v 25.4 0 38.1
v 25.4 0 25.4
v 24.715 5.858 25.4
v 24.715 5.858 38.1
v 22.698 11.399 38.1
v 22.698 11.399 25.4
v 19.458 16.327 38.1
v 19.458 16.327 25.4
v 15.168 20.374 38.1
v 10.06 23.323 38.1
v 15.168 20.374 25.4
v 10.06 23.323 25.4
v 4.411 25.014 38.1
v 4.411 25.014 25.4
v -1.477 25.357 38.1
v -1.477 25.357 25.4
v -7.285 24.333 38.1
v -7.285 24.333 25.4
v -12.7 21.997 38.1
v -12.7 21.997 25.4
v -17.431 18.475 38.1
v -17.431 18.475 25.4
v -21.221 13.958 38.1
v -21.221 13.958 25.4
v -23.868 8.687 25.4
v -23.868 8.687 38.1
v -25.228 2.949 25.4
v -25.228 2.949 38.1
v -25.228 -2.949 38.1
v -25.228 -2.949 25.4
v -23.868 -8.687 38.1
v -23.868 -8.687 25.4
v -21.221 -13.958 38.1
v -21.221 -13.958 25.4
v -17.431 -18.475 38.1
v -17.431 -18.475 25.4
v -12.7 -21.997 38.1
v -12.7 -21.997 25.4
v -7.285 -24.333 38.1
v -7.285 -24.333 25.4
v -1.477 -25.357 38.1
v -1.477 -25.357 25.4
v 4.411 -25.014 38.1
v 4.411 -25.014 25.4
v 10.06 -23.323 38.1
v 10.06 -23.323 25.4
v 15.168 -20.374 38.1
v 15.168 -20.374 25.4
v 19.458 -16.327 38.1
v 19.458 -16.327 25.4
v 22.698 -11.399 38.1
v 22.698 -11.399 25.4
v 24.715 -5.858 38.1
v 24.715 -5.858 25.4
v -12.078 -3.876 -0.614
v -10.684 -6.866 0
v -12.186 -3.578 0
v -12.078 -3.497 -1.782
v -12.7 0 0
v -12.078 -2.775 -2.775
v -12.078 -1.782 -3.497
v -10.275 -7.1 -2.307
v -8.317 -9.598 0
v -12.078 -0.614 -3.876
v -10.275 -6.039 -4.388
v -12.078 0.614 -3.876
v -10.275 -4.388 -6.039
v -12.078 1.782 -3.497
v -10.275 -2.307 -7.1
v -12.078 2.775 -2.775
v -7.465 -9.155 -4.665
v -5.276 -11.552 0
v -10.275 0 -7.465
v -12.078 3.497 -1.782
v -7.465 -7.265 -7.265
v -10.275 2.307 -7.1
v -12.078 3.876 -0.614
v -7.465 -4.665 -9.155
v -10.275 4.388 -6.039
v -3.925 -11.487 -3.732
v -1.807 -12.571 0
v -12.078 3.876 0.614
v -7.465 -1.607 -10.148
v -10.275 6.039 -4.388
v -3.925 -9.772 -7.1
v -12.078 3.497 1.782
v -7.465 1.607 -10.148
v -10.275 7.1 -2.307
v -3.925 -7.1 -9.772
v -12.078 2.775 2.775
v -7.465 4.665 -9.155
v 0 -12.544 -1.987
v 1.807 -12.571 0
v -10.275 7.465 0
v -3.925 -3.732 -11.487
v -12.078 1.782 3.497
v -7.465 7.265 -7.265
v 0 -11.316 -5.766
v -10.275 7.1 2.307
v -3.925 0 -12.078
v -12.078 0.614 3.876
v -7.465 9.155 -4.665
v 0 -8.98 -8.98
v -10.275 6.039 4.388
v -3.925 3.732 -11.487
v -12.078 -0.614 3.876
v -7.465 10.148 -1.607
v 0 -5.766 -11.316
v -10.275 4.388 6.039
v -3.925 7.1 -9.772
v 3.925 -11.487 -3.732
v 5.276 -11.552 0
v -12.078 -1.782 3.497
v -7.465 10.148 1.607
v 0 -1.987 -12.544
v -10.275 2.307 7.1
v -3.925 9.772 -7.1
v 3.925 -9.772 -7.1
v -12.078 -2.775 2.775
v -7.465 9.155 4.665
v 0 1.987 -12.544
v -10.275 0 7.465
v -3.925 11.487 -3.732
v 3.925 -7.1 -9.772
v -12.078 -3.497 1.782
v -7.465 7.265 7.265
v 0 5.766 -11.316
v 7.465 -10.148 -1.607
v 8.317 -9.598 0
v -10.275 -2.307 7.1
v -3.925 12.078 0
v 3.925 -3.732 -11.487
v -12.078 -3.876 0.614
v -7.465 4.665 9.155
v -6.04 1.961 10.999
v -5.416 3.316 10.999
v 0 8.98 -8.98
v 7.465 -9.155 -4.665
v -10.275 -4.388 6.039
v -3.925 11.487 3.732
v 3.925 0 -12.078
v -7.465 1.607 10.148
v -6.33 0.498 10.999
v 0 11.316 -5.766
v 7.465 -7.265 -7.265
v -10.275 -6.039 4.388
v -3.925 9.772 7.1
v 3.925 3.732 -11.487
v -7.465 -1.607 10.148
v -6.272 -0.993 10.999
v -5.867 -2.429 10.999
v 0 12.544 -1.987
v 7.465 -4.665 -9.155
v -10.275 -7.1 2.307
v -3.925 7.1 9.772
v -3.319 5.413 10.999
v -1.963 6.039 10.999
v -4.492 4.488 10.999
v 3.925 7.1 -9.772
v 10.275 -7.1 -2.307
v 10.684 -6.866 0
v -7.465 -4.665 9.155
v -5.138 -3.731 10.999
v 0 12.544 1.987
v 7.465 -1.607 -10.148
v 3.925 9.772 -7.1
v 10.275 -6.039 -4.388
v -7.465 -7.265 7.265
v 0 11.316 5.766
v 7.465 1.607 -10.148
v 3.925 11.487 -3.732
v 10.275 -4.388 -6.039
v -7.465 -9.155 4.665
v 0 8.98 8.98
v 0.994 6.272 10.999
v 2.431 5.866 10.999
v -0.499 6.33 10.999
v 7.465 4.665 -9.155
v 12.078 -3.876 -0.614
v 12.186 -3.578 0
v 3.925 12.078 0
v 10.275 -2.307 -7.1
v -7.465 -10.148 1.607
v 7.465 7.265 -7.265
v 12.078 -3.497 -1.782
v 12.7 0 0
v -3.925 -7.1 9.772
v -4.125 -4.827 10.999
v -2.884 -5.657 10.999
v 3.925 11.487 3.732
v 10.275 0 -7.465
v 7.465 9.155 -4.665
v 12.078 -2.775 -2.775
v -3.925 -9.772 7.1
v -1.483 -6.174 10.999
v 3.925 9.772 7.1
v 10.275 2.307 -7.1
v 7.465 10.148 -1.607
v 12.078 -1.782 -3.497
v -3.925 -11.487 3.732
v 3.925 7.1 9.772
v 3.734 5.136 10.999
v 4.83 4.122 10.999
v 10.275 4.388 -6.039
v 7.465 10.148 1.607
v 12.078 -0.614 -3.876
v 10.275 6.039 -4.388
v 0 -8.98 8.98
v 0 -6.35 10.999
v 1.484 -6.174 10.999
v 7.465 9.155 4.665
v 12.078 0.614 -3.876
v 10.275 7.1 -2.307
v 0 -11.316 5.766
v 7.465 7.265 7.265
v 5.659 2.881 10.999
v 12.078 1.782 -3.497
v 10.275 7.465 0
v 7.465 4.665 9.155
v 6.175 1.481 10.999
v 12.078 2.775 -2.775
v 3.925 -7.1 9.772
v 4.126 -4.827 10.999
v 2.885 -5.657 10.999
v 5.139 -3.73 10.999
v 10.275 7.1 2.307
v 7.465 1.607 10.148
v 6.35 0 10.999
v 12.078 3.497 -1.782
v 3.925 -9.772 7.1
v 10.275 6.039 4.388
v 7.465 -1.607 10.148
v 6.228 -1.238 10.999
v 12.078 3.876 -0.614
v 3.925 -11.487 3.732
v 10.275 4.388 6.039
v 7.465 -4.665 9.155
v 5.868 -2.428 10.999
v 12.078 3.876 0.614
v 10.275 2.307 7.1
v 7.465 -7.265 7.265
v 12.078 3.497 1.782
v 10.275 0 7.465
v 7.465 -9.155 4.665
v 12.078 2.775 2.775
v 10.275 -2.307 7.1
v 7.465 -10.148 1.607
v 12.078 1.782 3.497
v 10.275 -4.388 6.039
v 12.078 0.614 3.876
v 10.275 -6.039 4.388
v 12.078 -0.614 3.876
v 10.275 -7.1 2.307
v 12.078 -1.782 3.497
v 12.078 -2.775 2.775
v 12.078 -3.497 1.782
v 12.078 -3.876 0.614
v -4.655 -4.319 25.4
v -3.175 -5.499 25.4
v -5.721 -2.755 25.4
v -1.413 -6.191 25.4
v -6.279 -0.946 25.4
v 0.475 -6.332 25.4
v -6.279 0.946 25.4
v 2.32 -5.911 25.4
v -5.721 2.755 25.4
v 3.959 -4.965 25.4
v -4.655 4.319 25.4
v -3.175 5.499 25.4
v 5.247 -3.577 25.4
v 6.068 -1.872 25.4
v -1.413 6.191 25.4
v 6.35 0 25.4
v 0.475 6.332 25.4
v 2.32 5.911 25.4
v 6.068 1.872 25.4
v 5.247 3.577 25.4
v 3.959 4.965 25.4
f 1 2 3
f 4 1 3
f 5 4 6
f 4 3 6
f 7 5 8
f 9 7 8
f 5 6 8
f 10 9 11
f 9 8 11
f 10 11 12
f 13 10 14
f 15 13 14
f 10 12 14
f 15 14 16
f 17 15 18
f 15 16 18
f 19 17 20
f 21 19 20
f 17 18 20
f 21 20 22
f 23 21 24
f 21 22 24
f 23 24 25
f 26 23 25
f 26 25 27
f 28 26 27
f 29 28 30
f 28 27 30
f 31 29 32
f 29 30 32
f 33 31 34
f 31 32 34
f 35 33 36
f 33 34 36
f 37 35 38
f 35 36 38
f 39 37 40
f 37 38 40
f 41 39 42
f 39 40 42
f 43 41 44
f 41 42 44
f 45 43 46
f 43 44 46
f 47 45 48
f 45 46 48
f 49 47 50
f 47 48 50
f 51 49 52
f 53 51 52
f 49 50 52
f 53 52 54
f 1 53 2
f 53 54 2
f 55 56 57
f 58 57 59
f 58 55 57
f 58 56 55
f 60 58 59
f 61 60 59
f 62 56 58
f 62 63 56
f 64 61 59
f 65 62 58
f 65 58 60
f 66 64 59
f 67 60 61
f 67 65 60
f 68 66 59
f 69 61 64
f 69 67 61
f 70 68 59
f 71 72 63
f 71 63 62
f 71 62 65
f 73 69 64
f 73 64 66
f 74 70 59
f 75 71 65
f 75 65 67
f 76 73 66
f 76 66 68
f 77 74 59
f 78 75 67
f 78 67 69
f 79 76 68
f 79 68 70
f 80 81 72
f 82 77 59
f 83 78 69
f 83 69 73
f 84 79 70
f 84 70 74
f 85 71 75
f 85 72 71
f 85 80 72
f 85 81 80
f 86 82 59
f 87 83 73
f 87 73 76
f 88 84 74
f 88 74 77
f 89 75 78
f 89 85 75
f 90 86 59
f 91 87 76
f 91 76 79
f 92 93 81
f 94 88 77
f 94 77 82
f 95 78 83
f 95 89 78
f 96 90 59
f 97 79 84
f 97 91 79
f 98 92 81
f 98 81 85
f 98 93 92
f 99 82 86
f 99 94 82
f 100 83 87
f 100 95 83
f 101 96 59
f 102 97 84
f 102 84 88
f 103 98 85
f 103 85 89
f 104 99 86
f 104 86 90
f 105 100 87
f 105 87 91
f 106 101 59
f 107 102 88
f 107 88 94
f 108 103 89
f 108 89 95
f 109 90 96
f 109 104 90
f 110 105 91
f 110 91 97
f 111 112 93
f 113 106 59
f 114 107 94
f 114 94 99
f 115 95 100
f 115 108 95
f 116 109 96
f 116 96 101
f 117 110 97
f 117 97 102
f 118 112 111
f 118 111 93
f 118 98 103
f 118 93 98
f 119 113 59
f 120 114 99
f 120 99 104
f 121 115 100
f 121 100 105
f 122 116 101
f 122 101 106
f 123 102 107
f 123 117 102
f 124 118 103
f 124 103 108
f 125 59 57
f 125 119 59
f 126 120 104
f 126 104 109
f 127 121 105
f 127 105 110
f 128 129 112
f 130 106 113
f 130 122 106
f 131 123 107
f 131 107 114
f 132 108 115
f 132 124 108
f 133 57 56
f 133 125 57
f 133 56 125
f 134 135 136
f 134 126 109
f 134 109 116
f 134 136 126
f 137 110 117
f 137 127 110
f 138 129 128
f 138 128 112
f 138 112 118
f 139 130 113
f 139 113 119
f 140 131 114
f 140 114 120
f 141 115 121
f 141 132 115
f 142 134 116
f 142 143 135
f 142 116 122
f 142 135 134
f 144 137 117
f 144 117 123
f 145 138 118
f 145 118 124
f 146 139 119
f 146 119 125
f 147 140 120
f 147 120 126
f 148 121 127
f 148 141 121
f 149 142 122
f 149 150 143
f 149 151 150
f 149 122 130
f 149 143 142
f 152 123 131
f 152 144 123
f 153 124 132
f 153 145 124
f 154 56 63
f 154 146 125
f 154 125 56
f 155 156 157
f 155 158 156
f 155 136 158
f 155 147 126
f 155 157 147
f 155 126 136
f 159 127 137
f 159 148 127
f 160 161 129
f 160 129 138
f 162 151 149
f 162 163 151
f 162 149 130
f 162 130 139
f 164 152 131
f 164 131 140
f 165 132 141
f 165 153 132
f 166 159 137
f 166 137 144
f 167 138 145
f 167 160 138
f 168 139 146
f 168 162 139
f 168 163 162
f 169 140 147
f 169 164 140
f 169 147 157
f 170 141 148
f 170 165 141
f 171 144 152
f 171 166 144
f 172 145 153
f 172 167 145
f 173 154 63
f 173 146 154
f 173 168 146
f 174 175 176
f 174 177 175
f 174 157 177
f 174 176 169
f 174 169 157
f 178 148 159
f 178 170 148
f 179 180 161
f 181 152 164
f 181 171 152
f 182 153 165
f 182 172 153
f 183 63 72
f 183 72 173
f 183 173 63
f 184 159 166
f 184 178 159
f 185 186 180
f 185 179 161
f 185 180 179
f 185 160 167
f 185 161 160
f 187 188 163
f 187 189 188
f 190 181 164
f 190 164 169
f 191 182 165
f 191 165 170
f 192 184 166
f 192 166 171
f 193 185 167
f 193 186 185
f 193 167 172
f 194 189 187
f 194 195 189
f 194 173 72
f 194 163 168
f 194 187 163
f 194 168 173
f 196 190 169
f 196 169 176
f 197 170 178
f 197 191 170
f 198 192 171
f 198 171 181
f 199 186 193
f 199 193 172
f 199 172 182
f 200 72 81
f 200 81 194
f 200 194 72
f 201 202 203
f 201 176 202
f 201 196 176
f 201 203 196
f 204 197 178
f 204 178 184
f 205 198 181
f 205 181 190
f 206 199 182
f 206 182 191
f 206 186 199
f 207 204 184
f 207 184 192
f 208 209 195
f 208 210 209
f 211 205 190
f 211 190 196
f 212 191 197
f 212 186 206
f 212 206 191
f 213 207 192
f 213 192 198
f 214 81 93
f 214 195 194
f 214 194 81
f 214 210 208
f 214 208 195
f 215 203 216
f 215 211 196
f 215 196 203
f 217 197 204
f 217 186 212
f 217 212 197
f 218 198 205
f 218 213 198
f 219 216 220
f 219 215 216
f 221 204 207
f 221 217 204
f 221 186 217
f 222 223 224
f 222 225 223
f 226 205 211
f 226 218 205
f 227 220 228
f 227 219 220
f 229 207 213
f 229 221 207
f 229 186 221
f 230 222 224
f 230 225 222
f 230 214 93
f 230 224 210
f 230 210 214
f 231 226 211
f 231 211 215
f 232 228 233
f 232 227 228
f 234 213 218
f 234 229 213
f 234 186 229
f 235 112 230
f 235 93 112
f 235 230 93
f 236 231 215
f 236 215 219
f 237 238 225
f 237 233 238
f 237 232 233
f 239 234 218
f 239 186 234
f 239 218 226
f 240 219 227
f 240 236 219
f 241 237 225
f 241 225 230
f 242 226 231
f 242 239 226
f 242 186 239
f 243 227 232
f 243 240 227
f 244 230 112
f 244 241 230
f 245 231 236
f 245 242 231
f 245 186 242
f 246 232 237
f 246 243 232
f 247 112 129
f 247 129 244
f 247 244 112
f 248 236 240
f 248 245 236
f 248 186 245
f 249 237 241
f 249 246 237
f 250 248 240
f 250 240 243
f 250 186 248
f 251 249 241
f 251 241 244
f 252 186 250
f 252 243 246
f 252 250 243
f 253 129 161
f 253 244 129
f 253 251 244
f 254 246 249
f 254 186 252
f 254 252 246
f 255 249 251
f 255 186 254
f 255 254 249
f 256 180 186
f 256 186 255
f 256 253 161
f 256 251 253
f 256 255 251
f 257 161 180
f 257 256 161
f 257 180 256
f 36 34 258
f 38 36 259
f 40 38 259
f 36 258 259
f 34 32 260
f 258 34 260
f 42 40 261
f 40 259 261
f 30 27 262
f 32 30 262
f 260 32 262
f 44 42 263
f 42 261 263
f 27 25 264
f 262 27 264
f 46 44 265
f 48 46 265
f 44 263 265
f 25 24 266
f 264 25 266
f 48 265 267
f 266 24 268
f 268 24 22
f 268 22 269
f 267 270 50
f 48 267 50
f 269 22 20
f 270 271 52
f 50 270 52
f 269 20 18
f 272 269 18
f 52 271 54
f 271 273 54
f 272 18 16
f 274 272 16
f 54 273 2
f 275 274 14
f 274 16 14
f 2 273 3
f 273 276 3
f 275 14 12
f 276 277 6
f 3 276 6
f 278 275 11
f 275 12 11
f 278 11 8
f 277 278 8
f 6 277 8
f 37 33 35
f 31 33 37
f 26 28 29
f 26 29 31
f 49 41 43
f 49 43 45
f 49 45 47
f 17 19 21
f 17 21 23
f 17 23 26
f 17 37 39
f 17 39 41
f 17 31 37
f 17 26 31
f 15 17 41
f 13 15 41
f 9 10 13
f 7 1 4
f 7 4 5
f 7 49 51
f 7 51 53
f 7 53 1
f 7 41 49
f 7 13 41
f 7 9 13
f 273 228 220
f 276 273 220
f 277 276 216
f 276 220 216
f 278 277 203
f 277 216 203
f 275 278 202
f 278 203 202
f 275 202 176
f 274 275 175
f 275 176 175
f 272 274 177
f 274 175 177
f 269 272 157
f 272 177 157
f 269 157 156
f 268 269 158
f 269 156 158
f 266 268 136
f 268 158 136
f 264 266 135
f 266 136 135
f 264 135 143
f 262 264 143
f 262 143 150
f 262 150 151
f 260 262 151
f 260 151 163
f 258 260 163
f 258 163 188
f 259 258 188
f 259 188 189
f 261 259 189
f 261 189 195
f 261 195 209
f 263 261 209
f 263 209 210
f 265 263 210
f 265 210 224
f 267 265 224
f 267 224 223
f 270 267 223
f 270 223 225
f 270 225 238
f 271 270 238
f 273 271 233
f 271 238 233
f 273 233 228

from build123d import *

# Parameters (mm, degrees)
F2_R     = 6.35
F3_DEPTH = 25.4
F4_R     = 25.4
F5_DEPTH = 12.7


with BuildPart() as f1:
    # F0 (on Top) → F1 (revolve)
    with BuildSketch(Plane.XY):
        with BuildLine():
            ThreePointArc((-12.7, 0), (0, -12.7), (12.7, 0))
            Line((12.7, 0), (-12.7, 0))
        make_face()
    revolve(axis=Axis((0, 0, 0), (1, 0, 0)))

    # F2 (on Top) → F3 (join)
    with BuildSketch(Plane.XY):
        Circle(F2_R)
    extrude(amount=F3_DEPTH)

    # F4 (on face) → F5 (join)
    with BuildSketch(Plane.XY.offset(25.4)):
        Circle(F4_R)
    extrude(amount=F5_DEPTH)


solid = f1.part
